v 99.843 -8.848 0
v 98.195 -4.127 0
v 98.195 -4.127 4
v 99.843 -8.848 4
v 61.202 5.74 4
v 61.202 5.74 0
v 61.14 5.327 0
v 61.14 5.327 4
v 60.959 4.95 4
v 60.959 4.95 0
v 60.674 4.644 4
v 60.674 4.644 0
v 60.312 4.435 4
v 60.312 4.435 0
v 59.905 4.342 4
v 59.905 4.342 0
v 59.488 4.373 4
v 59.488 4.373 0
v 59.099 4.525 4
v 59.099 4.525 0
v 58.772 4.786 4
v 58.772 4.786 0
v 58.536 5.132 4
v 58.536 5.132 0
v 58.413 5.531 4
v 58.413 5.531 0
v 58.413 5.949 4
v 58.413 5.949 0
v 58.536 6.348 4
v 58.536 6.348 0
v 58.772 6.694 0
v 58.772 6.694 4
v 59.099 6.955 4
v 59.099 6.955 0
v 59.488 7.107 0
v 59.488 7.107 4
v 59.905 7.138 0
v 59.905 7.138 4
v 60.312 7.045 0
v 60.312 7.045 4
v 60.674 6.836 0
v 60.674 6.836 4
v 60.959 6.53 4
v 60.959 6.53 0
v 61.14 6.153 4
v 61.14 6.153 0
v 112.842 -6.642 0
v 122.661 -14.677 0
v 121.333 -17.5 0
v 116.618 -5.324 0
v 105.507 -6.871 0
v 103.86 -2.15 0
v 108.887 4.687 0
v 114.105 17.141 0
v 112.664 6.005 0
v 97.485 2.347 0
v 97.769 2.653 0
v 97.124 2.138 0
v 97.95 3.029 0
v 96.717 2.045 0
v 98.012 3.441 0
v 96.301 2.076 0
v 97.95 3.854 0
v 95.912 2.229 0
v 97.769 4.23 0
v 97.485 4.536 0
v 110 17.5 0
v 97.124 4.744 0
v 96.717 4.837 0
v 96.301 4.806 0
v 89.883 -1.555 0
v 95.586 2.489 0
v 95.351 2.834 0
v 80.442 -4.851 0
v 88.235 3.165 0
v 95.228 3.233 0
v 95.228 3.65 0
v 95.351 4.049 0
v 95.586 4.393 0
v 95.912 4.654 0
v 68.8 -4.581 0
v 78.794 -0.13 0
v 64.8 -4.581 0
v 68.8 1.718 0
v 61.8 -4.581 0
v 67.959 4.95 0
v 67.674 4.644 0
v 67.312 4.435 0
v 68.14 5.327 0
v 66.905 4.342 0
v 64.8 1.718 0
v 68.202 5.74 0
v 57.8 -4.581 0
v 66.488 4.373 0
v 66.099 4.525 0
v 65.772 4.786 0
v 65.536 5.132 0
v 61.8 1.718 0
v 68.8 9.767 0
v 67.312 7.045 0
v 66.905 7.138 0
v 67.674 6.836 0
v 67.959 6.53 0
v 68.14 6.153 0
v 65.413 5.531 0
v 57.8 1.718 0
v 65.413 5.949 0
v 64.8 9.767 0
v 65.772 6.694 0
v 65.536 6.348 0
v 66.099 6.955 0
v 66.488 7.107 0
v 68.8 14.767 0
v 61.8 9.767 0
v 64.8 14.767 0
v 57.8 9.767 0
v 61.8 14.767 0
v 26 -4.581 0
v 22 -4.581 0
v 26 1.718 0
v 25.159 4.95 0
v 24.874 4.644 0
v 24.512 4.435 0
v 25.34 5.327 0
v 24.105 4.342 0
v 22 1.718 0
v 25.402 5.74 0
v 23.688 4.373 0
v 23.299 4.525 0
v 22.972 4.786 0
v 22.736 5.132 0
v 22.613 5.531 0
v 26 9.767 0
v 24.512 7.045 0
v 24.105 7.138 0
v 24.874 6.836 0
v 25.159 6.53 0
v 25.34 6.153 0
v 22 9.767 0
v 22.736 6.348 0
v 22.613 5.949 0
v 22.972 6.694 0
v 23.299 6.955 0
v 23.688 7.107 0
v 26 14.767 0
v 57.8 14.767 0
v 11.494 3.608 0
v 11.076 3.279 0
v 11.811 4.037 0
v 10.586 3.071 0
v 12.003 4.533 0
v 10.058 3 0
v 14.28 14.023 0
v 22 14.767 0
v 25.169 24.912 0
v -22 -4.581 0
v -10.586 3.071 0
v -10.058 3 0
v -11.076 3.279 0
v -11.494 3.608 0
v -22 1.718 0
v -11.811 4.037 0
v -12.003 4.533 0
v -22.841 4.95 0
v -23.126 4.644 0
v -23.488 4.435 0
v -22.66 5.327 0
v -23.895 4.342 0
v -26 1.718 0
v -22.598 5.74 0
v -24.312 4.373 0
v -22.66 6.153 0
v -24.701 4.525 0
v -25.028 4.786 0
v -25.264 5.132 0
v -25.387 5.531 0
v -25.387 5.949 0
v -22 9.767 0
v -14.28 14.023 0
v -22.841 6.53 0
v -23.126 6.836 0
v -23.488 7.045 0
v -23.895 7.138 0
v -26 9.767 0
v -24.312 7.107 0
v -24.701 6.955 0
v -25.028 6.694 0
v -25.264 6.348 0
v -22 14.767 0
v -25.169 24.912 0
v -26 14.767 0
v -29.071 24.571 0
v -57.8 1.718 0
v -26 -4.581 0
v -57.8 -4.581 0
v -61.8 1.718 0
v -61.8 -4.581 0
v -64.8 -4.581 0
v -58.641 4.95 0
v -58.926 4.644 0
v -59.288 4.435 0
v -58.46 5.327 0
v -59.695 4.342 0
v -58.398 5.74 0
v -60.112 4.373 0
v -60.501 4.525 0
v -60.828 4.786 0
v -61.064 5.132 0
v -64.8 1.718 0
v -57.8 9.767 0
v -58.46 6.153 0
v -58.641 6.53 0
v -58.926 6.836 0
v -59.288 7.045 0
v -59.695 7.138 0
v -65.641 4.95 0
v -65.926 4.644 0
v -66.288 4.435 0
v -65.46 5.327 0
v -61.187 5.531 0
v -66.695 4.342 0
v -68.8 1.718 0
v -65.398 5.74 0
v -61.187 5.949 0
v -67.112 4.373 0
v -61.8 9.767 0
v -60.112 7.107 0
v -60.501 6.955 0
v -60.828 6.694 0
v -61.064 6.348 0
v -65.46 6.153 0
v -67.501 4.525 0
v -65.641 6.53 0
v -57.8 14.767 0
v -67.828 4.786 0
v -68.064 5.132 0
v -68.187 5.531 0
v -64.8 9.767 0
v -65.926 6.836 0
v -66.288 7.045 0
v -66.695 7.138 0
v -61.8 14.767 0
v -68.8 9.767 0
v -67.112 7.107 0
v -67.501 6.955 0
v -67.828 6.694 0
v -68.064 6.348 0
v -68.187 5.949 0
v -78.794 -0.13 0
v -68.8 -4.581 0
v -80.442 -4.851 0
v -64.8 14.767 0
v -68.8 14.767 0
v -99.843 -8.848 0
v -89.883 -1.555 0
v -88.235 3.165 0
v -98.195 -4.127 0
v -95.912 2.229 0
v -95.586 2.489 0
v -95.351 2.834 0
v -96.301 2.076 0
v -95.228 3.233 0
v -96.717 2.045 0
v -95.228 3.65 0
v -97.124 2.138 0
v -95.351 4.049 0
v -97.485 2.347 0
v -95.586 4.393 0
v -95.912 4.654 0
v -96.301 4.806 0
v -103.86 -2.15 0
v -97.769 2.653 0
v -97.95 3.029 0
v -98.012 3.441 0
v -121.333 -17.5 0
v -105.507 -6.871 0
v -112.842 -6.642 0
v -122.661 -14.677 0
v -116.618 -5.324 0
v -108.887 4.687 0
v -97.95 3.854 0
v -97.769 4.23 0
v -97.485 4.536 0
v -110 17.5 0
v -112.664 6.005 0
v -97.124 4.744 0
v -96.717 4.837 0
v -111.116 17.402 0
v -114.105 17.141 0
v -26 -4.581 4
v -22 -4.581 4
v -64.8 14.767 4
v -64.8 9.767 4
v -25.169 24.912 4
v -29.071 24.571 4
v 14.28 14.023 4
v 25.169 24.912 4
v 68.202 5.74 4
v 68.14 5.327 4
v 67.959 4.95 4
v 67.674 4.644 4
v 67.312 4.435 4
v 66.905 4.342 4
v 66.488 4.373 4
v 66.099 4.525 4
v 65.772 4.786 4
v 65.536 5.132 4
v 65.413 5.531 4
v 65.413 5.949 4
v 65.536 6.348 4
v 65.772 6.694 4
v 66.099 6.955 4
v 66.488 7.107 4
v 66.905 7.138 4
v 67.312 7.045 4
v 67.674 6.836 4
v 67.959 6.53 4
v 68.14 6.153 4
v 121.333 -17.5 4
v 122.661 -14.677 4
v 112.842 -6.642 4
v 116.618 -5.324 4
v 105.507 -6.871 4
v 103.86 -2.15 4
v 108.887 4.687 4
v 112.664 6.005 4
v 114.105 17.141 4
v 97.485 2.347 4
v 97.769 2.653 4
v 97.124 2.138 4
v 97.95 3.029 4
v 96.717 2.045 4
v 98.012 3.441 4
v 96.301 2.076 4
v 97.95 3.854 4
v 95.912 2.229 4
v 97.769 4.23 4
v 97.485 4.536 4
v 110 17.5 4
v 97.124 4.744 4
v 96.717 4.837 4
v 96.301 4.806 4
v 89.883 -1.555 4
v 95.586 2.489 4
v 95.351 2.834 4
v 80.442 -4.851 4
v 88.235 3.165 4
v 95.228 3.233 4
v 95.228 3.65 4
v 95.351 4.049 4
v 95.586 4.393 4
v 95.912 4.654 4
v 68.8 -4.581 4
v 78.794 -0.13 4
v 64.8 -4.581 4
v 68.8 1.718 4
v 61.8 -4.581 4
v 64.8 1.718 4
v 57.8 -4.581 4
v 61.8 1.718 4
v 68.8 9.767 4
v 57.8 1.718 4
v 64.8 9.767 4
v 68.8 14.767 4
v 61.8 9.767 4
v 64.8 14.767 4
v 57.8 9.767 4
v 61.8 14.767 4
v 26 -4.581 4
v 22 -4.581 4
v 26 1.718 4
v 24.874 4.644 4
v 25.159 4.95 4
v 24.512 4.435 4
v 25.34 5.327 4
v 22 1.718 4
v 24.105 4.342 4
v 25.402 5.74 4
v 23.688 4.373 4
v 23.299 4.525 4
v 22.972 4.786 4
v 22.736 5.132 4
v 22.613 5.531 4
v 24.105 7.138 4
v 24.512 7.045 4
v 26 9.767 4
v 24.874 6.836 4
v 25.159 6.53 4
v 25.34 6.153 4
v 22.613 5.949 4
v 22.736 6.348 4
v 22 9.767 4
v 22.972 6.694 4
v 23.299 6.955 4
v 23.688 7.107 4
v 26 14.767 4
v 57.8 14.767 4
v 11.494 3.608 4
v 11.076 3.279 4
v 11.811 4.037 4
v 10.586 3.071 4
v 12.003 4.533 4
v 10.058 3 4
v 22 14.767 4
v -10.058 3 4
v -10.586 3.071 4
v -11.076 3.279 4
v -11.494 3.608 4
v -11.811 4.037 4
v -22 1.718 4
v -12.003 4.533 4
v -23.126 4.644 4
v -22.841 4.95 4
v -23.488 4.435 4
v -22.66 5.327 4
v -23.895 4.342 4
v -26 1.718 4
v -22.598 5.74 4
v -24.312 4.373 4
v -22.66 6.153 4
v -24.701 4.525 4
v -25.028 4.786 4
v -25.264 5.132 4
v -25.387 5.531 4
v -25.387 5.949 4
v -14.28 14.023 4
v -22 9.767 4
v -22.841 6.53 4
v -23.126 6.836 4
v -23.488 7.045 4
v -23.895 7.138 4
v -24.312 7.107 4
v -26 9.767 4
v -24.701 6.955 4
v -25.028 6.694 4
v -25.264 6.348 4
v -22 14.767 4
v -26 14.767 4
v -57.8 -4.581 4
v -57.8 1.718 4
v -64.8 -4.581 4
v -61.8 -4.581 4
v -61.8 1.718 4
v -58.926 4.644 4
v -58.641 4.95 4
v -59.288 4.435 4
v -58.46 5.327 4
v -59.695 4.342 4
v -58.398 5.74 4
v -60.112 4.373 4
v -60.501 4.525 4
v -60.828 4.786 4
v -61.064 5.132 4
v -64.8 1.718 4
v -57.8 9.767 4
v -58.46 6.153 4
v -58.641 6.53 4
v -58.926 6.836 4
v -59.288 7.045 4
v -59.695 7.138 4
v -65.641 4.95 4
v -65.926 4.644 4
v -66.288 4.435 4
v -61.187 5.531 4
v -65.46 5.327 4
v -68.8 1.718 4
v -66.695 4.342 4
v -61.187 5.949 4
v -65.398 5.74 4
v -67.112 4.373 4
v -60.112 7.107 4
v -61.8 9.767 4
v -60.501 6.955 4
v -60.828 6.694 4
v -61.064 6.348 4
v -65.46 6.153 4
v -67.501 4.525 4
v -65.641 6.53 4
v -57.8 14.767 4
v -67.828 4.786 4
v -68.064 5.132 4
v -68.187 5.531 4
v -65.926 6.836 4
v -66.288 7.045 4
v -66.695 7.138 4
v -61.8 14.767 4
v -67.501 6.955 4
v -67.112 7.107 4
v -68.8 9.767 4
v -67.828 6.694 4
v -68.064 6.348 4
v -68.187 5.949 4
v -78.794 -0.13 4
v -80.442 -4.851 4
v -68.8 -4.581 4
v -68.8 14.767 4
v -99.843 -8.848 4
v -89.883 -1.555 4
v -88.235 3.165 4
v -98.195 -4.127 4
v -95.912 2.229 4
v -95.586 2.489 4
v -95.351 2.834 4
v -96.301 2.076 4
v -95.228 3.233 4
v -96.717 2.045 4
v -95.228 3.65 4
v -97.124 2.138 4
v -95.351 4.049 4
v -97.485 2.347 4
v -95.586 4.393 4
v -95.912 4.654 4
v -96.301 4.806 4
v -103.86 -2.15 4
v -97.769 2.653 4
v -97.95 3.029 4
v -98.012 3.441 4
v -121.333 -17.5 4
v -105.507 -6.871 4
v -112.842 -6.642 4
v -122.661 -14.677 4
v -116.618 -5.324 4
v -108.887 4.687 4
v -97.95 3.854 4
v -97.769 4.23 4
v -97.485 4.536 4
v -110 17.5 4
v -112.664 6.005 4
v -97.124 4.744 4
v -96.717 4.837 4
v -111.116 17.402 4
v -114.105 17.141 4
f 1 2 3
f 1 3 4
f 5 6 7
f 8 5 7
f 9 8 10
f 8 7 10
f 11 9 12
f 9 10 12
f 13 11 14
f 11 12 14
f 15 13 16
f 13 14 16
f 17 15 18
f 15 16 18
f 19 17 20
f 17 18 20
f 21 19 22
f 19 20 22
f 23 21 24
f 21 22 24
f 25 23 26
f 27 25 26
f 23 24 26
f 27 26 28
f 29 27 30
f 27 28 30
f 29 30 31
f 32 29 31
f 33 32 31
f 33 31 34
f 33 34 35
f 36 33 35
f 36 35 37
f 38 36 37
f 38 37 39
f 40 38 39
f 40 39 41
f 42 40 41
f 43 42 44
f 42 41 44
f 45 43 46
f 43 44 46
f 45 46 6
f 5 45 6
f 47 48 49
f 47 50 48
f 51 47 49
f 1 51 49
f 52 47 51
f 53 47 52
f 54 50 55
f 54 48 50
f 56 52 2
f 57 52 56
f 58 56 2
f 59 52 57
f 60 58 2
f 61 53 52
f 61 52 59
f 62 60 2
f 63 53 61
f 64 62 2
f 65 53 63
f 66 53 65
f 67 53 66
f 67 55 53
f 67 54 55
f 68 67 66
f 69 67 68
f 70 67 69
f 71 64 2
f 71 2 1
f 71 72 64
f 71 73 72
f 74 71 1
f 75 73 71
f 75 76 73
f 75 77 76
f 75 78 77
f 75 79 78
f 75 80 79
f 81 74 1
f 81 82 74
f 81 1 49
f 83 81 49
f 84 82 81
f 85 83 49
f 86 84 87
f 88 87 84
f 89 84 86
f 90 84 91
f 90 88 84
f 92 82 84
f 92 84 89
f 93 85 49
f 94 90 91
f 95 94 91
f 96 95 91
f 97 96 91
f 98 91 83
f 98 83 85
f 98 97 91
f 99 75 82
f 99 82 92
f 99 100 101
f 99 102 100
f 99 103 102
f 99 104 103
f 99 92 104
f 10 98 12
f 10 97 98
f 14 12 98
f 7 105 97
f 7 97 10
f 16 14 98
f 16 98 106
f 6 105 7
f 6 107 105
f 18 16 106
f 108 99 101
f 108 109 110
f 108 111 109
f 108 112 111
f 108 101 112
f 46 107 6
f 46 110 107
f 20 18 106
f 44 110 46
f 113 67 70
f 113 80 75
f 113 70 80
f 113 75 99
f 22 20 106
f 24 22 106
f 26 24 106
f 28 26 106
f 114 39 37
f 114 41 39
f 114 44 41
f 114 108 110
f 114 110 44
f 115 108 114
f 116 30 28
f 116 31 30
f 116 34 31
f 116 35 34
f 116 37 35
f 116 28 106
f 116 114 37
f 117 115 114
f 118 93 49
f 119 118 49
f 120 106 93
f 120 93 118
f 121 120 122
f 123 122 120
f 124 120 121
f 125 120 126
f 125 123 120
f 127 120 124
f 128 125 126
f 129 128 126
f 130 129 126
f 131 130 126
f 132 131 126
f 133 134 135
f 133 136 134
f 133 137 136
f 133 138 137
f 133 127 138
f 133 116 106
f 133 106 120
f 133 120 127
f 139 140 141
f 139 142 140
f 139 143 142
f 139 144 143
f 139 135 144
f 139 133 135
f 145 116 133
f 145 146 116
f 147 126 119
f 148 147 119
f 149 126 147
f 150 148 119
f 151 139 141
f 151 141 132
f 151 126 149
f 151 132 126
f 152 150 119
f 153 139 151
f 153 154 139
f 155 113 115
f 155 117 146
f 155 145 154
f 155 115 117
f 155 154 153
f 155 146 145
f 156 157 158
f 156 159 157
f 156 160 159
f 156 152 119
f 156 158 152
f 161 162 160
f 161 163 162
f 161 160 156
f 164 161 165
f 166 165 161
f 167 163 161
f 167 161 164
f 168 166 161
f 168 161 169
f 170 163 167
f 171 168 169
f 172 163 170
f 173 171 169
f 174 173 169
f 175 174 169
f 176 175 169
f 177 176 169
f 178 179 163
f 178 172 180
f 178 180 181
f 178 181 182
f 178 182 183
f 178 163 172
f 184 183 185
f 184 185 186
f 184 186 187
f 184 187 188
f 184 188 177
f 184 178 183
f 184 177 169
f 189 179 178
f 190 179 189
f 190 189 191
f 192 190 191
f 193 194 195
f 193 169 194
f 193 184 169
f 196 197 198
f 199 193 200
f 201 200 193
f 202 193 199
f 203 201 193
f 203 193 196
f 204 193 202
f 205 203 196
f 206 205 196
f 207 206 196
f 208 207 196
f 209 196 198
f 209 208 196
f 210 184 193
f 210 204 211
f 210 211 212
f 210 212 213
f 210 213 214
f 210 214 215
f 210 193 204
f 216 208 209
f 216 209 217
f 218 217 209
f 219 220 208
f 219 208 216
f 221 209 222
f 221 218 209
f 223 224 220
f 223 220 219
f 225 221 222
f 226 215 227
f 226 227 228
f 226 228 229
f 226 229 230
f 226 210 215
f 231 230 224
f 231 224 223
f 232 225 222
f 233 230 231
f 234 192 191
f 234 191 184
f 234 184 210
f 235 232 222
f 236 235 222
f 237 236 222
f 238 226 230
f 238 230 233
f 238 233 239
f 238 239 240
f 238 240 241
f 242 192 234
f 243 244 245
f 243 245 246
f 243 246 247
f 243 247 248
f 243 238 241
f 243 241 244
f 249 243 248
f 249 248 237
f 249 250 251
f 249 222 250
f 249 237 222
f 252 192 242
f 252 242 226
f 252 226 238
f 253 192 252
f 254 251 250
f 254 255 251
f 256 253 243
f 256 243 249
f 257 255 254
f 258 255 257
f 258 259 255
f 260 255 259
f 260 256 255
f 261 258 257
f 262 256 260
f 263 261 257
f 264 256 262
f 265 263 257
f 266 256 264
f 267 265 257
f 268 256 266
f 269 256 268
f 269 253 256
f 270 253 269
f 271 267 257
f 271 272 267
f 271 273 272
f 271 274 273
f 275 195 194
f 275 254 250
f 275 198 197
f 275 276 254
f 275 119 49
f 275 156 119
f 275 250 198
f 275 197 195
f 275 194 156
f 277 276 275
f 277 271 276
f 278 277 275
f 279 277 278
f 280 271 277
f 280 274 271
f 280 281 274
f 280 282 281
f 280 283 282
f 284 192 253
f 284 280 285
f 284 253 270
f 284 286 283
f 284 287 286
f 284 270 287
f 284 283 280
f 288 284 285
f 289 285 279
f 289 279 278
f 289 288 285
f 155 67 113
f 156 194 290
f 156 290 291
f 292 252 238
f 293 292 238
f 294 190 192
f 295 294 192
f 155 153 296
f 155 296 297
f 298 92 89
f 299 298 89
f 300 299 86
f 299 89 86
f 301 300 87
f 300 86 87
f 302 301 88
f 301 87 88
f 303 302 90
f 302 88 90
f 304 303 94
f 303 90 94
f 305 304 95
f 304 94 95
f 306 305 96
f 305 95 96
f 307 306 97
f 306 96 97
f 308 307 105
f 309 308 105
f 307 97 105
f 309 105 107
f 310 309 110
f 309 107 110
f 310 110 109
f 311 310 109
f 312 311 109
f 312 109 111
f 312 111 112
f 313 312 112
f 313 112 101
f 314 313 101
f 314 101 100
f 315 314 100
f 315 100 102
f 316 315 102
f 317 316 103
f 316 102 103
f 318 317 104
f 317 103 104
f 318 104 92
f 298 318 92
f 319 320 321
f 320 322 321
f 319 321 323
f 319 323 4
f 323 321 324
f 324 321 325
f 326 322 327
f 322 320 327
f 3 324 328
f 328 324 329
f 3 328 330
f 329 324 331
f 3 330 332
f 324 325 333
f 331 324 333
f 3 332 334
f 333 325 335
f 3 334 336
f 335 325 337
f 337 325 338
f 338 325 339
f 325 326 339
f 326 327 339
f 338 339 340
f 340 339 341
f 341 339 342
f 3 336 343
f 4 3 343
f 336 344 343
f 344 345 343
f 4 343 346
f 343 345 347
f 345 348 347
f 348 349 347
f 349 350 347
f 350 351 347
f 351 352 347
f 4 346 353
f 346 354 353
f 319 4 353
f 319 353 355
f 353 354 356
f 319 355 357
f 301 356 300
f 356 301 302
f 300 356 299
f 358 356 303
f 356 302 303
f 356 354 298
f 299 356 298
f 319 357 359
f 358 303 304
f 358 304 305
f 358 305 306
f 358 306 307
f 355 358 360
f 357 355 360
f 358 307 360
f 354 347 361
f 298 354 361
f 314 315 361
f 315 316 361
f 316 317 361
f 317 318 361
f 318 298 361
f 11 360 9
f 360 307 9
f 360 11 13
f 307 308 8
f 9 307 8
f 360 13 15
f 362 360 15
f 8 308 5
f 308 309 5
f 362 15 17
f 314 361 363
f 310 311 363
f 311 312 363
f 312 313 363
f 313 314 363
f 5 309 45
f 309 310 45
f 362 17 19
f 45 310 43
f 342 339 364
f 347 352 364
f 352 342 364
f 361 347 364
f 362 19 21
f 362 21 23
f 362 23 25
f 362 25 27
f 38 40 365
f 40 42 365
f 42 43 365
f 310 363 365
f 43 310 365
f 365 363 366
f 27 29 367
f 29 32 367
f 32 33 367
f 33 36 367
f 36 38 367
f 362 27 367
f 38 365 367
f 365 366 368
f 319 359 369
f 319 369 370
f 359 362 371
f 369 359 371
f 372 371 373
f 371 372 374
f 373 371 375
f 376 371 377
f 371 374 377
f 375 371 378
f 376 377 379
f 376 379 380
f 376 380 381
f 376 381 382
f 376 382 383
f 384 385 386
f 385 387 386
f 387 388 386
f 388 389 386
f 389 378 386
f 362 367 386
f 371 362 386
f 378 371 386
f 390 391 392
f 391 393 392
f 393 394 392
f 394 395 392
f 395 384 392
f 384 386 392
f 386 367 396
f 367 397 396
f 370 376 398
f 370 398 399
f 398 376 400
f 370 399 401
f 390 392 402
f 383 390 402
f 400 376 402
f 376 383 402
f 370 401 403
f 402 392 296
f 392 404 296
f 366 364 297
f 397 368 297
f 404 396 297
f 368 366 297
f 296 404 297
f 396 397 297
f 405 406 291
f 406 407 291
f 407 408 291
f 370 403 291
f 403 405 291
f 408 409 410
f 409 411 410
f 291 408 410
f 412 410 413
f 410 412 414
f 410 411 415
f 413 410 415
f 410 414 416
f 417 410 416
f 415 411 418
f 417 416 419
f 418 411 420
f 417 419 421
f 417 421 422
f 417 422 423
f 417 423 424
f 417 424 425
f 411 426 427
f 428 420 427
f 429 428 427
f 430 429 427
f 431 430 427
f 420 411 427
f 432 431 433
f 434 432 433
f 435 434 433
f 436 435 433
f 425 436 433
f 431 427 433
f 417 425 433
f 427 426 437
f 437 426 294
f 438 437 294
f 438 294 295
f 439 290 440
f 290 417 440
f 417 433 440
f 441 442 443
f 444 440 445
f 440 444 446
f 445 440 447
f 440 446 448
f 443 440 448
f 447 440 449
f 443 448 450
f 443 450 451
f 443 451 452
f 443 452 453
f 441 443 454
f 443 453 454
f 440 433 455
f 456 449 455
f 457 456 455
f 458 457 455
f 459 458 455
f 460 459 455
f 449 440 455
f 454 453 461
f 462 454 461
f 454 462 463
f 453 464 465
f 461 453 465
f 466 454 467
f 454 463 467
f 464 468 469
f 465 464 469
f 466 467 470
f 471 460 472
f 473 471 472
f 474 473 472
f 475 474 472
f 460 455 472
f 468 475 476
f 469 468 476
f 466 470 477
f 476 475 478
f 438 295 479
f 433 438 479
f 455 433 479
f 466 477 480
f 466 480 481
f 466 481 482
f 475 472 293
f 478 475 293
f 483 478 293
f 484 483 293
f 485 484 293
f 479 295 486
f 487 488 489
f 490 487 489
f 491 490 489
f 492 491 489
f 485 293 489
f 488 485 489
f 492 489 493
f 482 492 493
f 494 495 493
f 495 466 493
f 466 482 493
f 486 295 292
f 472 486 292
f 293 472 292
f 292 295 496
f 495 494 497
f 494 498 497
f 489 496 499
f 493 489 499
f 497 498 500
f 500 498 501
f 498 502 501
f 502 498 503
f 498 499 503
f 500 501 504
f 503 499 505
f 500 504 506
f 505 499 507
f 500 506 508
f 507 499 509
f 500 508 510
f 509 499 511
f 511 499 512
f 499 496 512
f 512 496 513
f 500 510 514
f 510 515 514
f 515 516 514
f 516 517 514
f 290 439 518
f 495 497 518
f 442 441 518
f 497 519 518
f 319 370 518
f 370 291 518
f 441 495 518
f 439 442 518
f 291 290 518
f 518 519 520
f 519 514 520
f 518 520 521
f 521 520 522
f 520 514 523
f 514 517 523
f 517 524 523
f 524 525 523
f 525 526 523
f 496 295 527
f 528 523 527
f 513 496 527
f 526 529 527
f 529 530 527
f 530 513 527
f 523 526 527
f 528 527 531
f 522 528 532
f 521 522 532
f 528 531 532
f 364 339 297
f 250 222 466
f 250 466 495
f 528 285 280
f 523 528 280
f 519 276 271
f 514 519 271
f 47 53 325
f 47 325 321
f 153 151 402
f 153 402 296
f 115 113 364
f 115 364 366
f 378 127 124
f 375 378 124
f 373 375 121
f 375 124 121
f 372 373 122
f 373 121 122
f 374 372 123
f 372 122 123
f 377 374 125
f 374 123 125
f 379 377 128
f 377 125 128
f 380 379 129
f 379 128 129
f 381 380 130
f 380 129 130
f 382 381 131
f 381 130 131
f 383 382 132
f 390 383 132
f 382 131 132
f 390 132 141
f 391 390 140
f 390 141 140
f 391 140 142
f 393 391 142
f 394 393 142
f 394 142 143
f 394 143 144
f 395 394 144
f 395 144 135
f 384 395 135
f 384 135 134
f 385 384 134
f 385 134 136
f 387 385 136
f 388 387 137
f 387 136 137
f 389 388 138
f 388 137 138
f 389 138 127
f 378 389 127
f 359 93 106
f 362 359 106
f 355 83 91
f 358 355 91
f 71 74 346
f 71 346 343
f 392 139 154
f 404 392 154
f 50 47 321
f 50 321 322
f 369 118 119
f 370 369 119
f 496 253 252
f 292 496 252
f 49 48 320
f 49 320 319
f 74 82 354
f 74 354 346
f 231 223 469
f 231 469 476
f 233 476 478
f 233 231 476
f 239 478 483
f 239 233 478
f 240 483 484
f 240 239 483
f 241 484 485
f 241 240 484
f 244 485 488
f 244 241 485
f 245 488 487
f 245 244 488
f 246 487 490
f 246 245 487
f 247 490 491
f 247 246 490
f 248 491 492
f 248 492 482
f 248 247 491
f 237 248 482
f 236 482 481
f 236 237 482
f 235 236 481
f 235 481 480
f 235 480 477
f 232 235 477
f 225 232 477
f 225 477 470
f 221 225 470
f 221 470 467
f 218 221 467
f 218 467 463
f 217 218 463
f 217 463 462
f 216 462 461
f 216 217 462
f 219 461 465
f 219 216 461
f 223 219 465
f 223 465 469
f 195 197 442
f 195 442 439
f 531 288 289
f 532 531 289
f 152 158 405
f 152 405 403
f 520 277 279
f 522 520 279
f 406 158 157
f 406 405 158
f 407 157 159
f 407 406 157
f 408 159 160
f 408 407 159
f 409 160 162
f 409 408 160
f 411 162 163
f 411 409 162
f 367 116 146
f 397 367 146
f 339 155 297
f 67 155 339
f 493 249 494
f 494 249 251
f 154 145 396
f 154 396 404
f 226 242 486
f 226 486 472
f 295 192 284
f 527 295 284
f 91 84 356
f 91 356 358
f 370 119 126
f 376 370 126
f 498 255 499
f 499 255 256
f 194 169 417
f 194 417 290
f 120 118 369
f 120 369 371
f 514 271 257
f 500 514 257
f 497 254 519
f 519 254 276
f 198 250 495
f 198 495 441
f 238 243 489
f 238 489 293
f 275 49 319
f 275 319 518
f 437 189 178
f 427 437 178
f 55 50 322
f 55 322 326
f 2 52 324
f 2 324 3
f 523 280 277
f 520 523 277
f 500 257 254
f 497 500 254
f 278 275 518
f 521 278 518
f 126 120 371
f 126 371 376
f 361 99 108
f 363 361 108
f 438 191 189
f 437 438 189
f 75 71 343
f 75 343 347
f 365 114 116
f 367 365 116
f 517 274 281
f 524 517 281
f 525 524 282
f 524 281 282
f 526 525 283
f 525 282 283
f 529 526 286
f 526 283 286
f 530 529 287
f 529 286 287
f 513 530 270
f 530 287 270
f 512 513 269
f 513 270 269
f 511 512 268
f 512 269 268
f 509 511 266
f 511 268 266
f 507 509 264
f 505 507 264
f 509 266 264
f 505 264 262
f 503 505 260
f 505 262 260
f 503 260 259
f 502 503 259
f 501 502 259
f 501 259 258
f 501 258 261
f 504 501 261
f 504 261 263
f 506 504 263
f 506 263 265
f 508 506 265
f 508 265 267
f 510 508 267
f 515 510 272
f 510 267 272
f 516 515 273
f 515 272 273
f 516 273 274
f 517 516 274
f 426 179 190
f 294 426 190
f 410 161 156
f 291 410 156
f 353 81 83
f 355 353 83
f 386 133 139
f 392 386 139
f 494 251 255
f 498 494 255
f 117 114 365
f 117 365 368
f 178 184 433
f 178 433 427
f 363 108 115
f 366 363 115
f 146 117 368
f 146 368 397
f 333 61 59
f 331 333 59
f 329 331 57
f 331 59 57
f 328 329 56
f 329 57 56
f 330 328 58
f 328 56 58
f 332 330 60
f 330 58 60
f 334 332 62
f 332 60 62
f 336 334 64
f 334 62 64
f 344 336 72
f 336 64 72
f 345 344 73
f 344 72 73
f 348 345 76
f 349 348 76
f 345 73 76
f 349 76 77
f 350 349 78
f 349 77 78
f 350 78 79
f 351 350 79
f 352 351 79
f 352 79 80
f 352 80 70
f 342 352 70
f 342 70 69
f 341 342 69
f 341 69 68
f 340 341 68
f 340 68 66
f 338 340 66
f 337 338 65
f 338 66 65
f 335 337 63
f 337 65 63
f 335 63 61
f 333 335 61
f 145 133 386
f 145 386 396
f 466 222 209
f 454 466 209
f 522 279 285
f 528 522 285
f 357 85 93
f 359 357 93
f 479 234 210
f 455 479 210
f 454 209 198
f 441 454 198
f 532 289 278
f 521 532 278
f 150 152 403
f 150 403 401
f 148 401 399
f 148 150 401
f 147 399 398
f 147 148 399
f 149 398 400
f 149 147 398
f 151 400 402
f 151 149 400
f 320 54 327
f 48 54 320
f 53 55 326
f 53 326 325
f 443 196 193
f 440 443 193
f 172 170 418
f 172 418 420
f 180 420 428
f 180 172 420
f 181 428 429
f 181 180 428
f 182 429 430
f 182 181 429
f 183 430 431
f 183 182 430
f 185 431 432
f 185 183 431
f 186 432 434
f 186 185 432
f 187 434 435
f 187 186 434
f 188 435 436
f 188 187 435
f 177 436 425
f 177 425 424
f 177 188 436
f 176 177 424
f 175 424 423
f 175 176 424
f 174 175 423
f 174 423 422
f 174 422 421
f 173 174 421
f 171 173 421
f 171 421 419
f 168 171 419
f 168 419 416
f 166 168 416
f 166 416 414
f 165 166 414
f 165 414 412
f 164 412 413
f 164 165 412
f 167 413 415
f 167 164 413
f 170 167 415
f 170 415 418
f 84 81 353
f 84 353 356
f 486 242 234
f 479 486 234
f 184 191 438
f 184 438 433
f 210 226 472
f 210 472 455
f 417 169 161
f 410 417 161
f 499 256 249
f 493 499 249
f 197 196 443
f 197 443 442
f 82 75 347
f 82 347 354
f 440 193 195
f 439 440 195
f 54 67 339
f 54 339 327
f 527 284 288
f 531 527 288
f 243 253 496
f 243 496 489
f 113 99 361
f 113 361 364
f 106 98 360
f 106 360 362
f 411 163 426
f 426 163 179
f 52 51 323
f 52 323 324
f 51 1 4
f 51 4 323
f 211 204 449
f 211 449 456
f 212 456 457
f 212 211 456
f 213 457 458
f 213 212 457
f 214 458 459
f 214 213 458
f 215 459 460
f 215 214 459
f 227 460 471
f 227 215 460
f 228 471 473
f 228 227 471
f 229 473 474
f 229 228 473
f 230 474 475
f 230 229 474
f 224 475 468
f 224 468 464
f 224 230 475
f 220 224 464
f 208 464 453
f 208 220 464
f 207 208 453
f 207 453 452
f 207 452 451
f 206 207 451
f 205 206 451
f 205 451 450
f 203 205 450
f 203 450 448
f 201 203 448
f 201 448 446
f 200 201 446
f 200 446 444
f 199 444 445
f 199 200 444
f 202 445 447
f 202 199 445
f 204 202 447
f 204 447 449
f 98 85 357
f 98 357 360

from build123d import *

# Parameters (mm, degrees)
SKETCH_1_W           = 220
SKETCH_1_H           = 35
EXTRUDE_1_DEPTH      = 4
CUT_EXTRUDE_1_DEPTH  = 10
CHAMFER_1_SIZE       = 5
EXTRUDE_2_DEPTH      = 4
EXTRUDE_3_DEPTH      = 4
EXTRUDE_4_DEPTH      = 4
EXTRUDE_7_DEPTH      = 4
FILLET_1_R           = 2
SKETCH_21_W          = 4
SKETCH_21_H          = 5
SKETCH_21_H_2        = 6.299038106
CUT_EXTRUDE_8_DEPTH  = 4
SKETCH_22_R          = 1.40240318
CUT_EXTRUDE_9_DEPTH  = 4
EXTRUDE_8_DEPTH      = 4
CUT_EXTRUDE_14_DEPTH = 10
CUT_EXTRUDE_15_DEPTH = 4
CHAMFER_2_SIZE       = 3
CHAMFER_2_SIZE2      = 2.344579619
SKETCH_29_W          = 6
SKETCH_29_H          = 5
SKETCH_29_W_2        = 10
SKETCH_29_W_3        = 4
SKETCH_29_H_2        = 12
CUT_EXTRUDE_16_DEPTH = 4
SKETCH_30_R          = 1.4
CUT_EXTRUDE_17_DEPTH = 4
EXTRUDE_9_DEPTH      = 4
SKETCH_35_R          = 44.644180149
CUT_EXTRUDE_19_DEPTH = 126.325939799
SKETCH_36_R          = 1.40240318
SKETCH_36_R_2        = 1.4
SKETCH_36_W          = 4
SKETCH_36_H          = 5
SKETCH_36_H_2        = 6.299038106
EXTRUDE_11_DEPTH     = 4


with BuildPart() as part:
    # 草图1 → 凸台-拉伸1 (new body)
    with BuildSketch(Plane.XY):
        Rectangle(SKETCH_1_W, SKETCH_1_H)
    extrude(amount=EXTRUDE_1_DEPTH)

    # 草图2 → 切除-拉伸1 (cut)
    with BuildSketch(Plane.XY.offset(4)):
        Polygon((0, 17.519994919), (-16.999988241, 17.5), (-16.999988241, 0), (17.000011759, 0), (17.000011759, 17.5), align=None)
    extrude(amount=-CUT_EXTRUDE_1_DEPTH, mode=Mode.SUBTRACT)

    # 倒角1
    chamfer_1_edges = [part.edges().sort_by_distance(p)[0] for p in [
        (17.000011759, 17.5, 2),
        (-16.999988241, 17.5, 2),
    ]]
    chamfer(chamfer_1_edges, length=CHAMFER_1_SIZE)

    # 草图3 → 凸台-拉伸2 (add)
    with BuildSketch(Plane(origin=(0, 0, 0), x_dir=(-1, 0, 0), z_dir=(0, 0, -1))):
        Polygon((-17.000011759, 0), (-17.000011759, 12.5), (-14.000011759, 0), align=None)
        Polygon((16.999988241, 12.5), (16.999988241, 0), (13.999988241, 0), align=None)
    extrude(amount=-EXTRUDE_2_DEPTH)

    # 草图4 → 凸台-拉伸3 (add)
    with BuildSketch(Plane(origin=(0, 0, 0), x_dir=(-1, 0, 0), z_dir=(0, 0, -1))):
        Polygon((-22.000011759, 17.5), (-29.071079571, 24.571067812), (-110, 17.5), align=None)
        Polygon((21.999988241, 17.5), (29.071056053, 24.571067812), (110, 17.5), align=None)
    extrude(amount=-EXTRUDE_3_DEPTH)

    # 草图7 → 凸台-拉伸4 (add)
    with BuildSketch(Plane(origin=(0, 0, 0), x_dir=(-1, 0, 0), z_dir=(0, 0, -1))):
        Polygon((-110, 17.5), (-115.977227757, 16.97774686), (-112.5, -17.5), (-110, -17.5), align=None)
    extrude_4 = extrude(amount=-EXTRUDE_4_DEPTH)

    # 草图19 → 凸台-拉伸7 (add)
    with BuildSketch(Plane(origin=(0, 0, 0), x_dir=(-1, 0, 0), z_dir=(0, 0, -1))):
        Polygon((-17.000011759, 12.5), (-29.071079571, 24.571067812), (-25.649595146, 25.392224074), (-14.280331934, 14.022960862), (-11.634821327, 3), (11.63479781, 3), (14.280308417, 14.022960862), (25.169324411, 24.911976857), (29.071056053, 24.571067812), (16.999988241, 12.5), (13.999988241, 0), (-14.000011759, 0), align=None)
    extrude(amount=-EXTRUDE_7_DEPTH)

    # 圆角1
    fillet_1_edges = [part.edges().sort_by_distance(p)[0] for p in [
        (-11.63479781, 3, 2),
        (11.634821327, 3, 2),
    ]]
    fillet(fillet_1_edges, radius=FILLET_1_R)

    # 草图21 → 切除-拉伸8 (cut)
    with BuildSketch(Plane(origin=(133.943153128, -40.880278438, 0), x_dir=(1, 0, 0), z_dir=(0, 0, -1))):
        with Locations((-67.143153128, -53.147127978)):
            Rectangle(SKETCH_21_W, SKETCH_21_H)
        with Locations((-74.143153128, -53.147127978)):
            Rectangle(SKETCH_21_W, SKETCH_21_H)
        with Locations((-67.143153128, -39.44868951)):
            Rectangle(SKETCH_21_W, SKETCH_21_H_2)
        with Locations((-74.143153128, -39.44868951)):
            Rectangle(SKETCH_21_W, SKETCH_21_H_2)
        with Locations((-109.943153128, -53.147127978)):
            Rectangle(SKETCH_21_W, SKETCH_21_H)
        with Locations((-109.943153128, -39.44868951)):
            Rectangle(SKETCH_21_W, SKETCH_21_H_2)
        with Locations((-157.943153128, -39.44868951)):
            Rectangle(SKETCH_21_W, SKETCH_21_H_2)
        with Locations((-157.943153128, -53.147127978)):
            Rectangle(SKETCH_21_W, SKETCH_21_H)
        with Locations((-200.743153128, -39.44868951)):
            Rectangle(SKETCH_21_W, SKETCH_21_H_2)
        with Locations((-193.743153128, -39.44868951)):
            Rectangle(SKETCH_21_W, SKETCH_21_H_2)
        with Locations((-193.743153128, -53.147127978)):
            Rectangle(SKETCH_21_W, SKETCH_21_H)
        with Locations((-200.743153128, -53.147127978)):
            Rectangle(SKETCH_21_W, SKETCH_21_H)
    extrude(amount=-CUT_EXTRUDE_8_DEPTH, mode=Mode.SUBTRACT)

    # 草图22 → 切除-拉伸9 (cut)
    with BuildSketch(Plane(origin=(133.943153128, -40.880278438, 0), x_dir=(1, 0, 0), z_dir=(0, 0, -1))):
        with Locations(Location((-109.943153128, -46.620265091, 0), (0, 0, 180))):
            Circle(SKETCH_22_R)
        with Locations(Location((-74.143153128, -46.620265091, 0), (0, 0, 180))):
            Circle(SKETCH_22_R)
        with Locations(Location((-67.143153128, -46.620265091, 0), (0, 0, 180))):
            Circle(SKETCH_22_R)
    cut_extrude_9 = extrude(amount=-CUT_EXTRUDE_9_DEPTH, mode=Mode.SUBTRACT)

    # 镜向10: 切除-拉伸9 across plane
    add(cut_extrude_9.mirror(Plane(origin=(0, 0, 0), x_dir=(0, 0, 1), z_dir=(1, 0, 0))), mode=Mode.SUBTRACT)

    # 镜向11: 凸台-拉伸4 across plane
    add(extrude_4.mirror(Plane(origin=(0, 0, 0), x_dir=(0, 0, 1), z_dir=(1, 0, 0))))

    # 草图23 → 凸台-拉伸8 (add)
    with BuildSketch(Plane(origin=(0, 0, 0), x_dir=(-1, 0, 0), z_dir=(0, 0, -1))):
        Polygon((115.977227757, 16.97774686), (112.5, -17.5), (123.677307019, -17.5), (127.041988649, 15.861818553), align=None)
    extrude(amount=-EXTRUDE_8_DEPTH)

    # 草图27 → 切除-拉伸14 (cut)
    with BuildSketch(Plane(origin=(0, 0, 0), x_dir=(-1, 0, 0), z_dir=(0, 0, -1))):
        Polygon((123.677307019, -17.5), (127.041988649, 15.861818553), (110.453235561, 19.244980627), (111.116335779, 17.402461494), align=None)
    extrude(amount=-CUT_EXTRUDE_14_DEPTH, mode=Mode.SUBTRACT)

    # 草图28 → 切除-拉伸15 (cut)
    with BuildSketch(Plane(origin=(133.943153128, -40.880278438, 0), x_dir=(1, 0, 0), z_dir=(0, 0, -1))):
        Polygon((-214.384814898, -36.029379852), (-223.826225744, -39.324795038), (-222.178518151, -44.04550046), (-212.737107305, -40.750085275), align=None)
        Polygon((-239.450613316, -34.009451966), (-237.802905723, -38.730157389), (-232.138059216, -36.752908277), (-233.785766808, -32.032202855), align=None)
        Polygon((-242.830523796, -45.567593925), (-246.785022019, -34.23790091), (-250.561586358, -35.556066985), (-246.607088135, -46.885759999), align=None)
    extrude(amount=-CUT_EXTRUDE_15_DEPTH, mode=Mode.SUBTRACT)

    # 倒角2
    chamfer_2_edges = [part.edges().sort_by_distance(p)[0] for p in [
        (-123.677307019, -17.5, 2),
    ]]
    chamfer_2_side = [part.faces().sort_by_distance(p)[0] for p in [
        (-117.396821399, -0.048769253, 2),
    ]]
    chamfer(chamfer_2_edges, length=CHAMFER_2_SIZE, length2=CHAMFER_2_SIZE2, reference=chamfer_2_side[0])

    # 草图29 → 切除-拉伸16 (cut)
    with BuildSketch(Plane(origin=(133.943153128, -40.880278438, 0), x_dir=(1, 0, 0), z_dir=(0, 0, -1))):
        with Locations((-37.943153128, -39.581582586)):
            Rectangle(SKETCH_29_W, SKETCH_29_H)
        with Locations((-52.943153128, -49.748900766)):
            Rectangle(SKETCH_29_W_2, SKETCH_29_H)
        with Locations((-25.943153128, -40.880278438)):
            Rectangle(SKETCH_29_W_3, SKETCH_29_H_2)
    extrude(amount=-CUT_EXTRUDE_16_DEPTH, mode=Mode.SUBTRACT)

    # 草图30 → 切除-拉伸17 (cut)
    with BuildSketch(Plane(origin=(133.943153128, -40.880278438, 0), x_dir=(1, 0, 0), z_dir=(0, 0, -1))):
        with Locations(Location((-39.943153128, -49.748900766, 0), (0, 0, 180))):
            Circle(SKETCH_30_R)
        with Locations(Location((-230.555500624, -44.321479898, 0), (0, 0, 180))):
            Circle(SKETCH_30_R)
    extrude(amount=-CUT_EXTRUDE_17_DEPTH, mode=Mode.SUBTRACT)

    # 草图31 → 凸台-拉伸9 (add)
    with BuildSketch(Plane(origin=(0, 0, 0), x_dir=(-1, 0, 0), z_dir=(0, 0, -1))):
        Polygon((111.116335769, 17.402461523), (114.104949654, 17.141335029), (122.661428914, -14.677236872), align=None)
    extrude(amount=-EXTRUDE_9_DEPTH)

    # 草图35 → 切除-拉伸19 (cut, through all)
    with BuildSketch(Plane(origin=(0, 0, 0), x_dir=(0, 0, -1), z_dir=(1, 0, 0))):
        Circle(SKETCH_35_R)
    extrude(amount=CUT_EXTRUDE_19_DEPTH, mode=Mode.SUBTRACT)

    # 草图36 → 凸台-拉伸11 (add)
    with BuildSketch(Plane(origin=(0, 0, 0), x_dir=(-1, 0, 0), z_dir=(0, 0, -1))):
        with BuildLine():
            Line((-121.3327274, -17.5), (121.3327274, -17.5))
            Line((121.3327274, -17.5), (122.661428914, -14.677236872))
            Line((122.661428914, -14.677236872), (114.104949654, 17.141335029))
            Line((114.104949654, 17.141335029), (110, 17.5))
            Line((110, 17.5), (25.169324411, 24.911976857))
            Line((25.169324411, 24.911976857), (14.280308417, 14.022960862))
            Line((14.280308417, 14.022960862), (12.002778792, 4.533254095))
            ThreePointArc((12.002778792, 4.533254095), (11.296250567, 3.429412242), (10.058004188, 3))
            Line((10.058004188, 3), (-10.058004188, 3))
            ThreePointArc((-10.058004188, 3), (-11.296250567, 3.429412242), (-12.002778792, 4.533254095))
            Line((-12.002778792, 4.533254095), (-14.280308417, 14.022960862))
            Line((-14.280308417, 14.022960862), (-25.169324411, 24.911976857))
            Line((-25.169324411, 24.911976857), (-110, 17.5))
            Line((-110, 17.5), (-114.104949654, 17.141335029))
            Line((-114.104949654, 17.141335029), (-122.661428914, -14.677236872))
            Line((-122.661428914, -14.677236872), (-121.3327274, -17.5))
        make_face()
        with Locations(Location((24, 5.739986652, 0), (0, 0, 180))):
            Circle(SKETCH_36_R, mode=Mode.SUBTRACT)
        with Locations(Location((59.8, 5.739986652, 0), (0, 0, 180))):
            Circle(SKETCH_36_R, mode=Mode.SUBTRACT)
        with Locations(Location((66.8, 5.739986652, 0), (0, 0, 180))):
            Circle(SKETCH_36_R, mode=Mode.SUBTRACT)
        with Locations((96.612347495, 3.44120146)):
            Circle(SKETCH_36_R_2, mode=Mode.SUBTRACT)
        with Locations(Location((-96.612347495, 3.44120146, 0), (0, 0, 180))):
            Circle(SKETCH_36_R_2, mode=Mode.SUBTRACT)
        with Locations(Location((-66.8, 5.739986652, 0), (0, 0, 180))):
            Circle(SKETCH_36_R, mode=Mode.SUBTRACT)
        with Locations(Location((-59.8, 5.739986652, 0), (0, 0, 180))):
            Circle(SKETCH_36_R, mode=Mode.SUBTRACT)
        with Locations(Location((-24, 5.739986652, 0), (0, 0, 180))):
            Circle(SKETCH_36_R, mode=Mode.SUBTRACT)
        with Locations((24, 12.26684954)):
            Rectangle(SKETCH_36_W, SKETCH_36_H, mode=Mode.SUBTRACT)
        with Locations((24, -1.431588928)):
            Rectangle(SKETCH_36_W, SKETCH_36_H_2, mode=Mode.SUBTRACT)
        Polygon((80.44166177, -4.850898586), (89.883072616, -1.5554834), (88.235365023, 3.165222022), (78.793954177, -0.130193163), align=None, mode=Mode.SUBTRACT)
        with Locations((59.8, -1.431588928)):
            Rectangle(SKETCH_36_W, SKETCH_36_H_2, mode=Mode.SUBTRACT)
        with Locations((59.8, 12.26684954)):
            Rectangle(SKETCH_36_W, SKETCH_36_H, mode=Mode.SUBTRACT)
        with Locations((66.8, 12.26684954)):
            Rectangle(SKETCH_36_W, SKETCH_36_H, mode=Mode.SUBTRACT)
        Polygon((112.841868891, -6.642377528), (116.618433229, -5.324211453), (112.663935006, 6.005481561), (108.887370668, 4.687315487), align=None, mode=Mode.SUBTRACT)
        Polygon((105.507460187, -6.870826472), (103.859752595, -2.150121049), (98.194906087, -4.127370161), (99.84261368, -8.848075584), align=None, mode=Mode.SUBTRACT)
        with Locations((66.8, -1.431588928)):
            Rectangle(SKETCH_36_W, SKETCH_36_H_2, mode=Mode.SUBTRACT)
        with Locations((-66.8, 12.26684954)):
            Rectangle(SKETCH_36_W, SKETCH_36_H, mode=Mode.SUBTRACT)
        with Locations((-66.8, -1.431588928)):
            Rectangle(SKETCH_36_W, SKETCH_36_H_2, mode=Mode.SUBTRACT)
        Polygon((-98.194906087, -4.127370161), (-99.84261368, -8.848075584), (-105.507460187, -6.870826472), (-103.859752595, -2.150121049), align=None, mode=Mode.SUBTRACT)
        Polygon((-108.887370668, 4.687315487), (-112.841868891, -6.642377528), (-116.618433229, -5.324211453), (-112.663935006, 6.005481561), align=None, mode=Mode.SUBTRACT)
        with Locations((-59.8, 12.26684954)):
            Rectangle(SKETCH_36_W, SKETCH_36_H, mode=Mode.SUBTRACT)
        with Locations((-59.8, -1.431588928)):
            Rectangle(SKETCH_36_W, SKETCH_36_H_2, mode=Mode.SUBTRACT)
        Polygon((-89.883072616, -1.5554834), (-88.235365023, 3.165222022), (-78.793954177, -0.130193163), (-80.44166177, -4.850898586), align=None, mode=Mode.SUBTRACT)
        with Locations((-24, -1.431588928)):
            Rectangle(SKETCH_36_W, SKETCH_36_H_2, mode=Mode.SUBTRACT)
        with Locations((-24, 12.26684954)):
            Rectangle(SKETCH_36_W, SKETCH_36_H, mode=Mode.SUBTRACT)
    extrude(amount=-EXTRUDE_11_DEPTH)


solid = part.part
